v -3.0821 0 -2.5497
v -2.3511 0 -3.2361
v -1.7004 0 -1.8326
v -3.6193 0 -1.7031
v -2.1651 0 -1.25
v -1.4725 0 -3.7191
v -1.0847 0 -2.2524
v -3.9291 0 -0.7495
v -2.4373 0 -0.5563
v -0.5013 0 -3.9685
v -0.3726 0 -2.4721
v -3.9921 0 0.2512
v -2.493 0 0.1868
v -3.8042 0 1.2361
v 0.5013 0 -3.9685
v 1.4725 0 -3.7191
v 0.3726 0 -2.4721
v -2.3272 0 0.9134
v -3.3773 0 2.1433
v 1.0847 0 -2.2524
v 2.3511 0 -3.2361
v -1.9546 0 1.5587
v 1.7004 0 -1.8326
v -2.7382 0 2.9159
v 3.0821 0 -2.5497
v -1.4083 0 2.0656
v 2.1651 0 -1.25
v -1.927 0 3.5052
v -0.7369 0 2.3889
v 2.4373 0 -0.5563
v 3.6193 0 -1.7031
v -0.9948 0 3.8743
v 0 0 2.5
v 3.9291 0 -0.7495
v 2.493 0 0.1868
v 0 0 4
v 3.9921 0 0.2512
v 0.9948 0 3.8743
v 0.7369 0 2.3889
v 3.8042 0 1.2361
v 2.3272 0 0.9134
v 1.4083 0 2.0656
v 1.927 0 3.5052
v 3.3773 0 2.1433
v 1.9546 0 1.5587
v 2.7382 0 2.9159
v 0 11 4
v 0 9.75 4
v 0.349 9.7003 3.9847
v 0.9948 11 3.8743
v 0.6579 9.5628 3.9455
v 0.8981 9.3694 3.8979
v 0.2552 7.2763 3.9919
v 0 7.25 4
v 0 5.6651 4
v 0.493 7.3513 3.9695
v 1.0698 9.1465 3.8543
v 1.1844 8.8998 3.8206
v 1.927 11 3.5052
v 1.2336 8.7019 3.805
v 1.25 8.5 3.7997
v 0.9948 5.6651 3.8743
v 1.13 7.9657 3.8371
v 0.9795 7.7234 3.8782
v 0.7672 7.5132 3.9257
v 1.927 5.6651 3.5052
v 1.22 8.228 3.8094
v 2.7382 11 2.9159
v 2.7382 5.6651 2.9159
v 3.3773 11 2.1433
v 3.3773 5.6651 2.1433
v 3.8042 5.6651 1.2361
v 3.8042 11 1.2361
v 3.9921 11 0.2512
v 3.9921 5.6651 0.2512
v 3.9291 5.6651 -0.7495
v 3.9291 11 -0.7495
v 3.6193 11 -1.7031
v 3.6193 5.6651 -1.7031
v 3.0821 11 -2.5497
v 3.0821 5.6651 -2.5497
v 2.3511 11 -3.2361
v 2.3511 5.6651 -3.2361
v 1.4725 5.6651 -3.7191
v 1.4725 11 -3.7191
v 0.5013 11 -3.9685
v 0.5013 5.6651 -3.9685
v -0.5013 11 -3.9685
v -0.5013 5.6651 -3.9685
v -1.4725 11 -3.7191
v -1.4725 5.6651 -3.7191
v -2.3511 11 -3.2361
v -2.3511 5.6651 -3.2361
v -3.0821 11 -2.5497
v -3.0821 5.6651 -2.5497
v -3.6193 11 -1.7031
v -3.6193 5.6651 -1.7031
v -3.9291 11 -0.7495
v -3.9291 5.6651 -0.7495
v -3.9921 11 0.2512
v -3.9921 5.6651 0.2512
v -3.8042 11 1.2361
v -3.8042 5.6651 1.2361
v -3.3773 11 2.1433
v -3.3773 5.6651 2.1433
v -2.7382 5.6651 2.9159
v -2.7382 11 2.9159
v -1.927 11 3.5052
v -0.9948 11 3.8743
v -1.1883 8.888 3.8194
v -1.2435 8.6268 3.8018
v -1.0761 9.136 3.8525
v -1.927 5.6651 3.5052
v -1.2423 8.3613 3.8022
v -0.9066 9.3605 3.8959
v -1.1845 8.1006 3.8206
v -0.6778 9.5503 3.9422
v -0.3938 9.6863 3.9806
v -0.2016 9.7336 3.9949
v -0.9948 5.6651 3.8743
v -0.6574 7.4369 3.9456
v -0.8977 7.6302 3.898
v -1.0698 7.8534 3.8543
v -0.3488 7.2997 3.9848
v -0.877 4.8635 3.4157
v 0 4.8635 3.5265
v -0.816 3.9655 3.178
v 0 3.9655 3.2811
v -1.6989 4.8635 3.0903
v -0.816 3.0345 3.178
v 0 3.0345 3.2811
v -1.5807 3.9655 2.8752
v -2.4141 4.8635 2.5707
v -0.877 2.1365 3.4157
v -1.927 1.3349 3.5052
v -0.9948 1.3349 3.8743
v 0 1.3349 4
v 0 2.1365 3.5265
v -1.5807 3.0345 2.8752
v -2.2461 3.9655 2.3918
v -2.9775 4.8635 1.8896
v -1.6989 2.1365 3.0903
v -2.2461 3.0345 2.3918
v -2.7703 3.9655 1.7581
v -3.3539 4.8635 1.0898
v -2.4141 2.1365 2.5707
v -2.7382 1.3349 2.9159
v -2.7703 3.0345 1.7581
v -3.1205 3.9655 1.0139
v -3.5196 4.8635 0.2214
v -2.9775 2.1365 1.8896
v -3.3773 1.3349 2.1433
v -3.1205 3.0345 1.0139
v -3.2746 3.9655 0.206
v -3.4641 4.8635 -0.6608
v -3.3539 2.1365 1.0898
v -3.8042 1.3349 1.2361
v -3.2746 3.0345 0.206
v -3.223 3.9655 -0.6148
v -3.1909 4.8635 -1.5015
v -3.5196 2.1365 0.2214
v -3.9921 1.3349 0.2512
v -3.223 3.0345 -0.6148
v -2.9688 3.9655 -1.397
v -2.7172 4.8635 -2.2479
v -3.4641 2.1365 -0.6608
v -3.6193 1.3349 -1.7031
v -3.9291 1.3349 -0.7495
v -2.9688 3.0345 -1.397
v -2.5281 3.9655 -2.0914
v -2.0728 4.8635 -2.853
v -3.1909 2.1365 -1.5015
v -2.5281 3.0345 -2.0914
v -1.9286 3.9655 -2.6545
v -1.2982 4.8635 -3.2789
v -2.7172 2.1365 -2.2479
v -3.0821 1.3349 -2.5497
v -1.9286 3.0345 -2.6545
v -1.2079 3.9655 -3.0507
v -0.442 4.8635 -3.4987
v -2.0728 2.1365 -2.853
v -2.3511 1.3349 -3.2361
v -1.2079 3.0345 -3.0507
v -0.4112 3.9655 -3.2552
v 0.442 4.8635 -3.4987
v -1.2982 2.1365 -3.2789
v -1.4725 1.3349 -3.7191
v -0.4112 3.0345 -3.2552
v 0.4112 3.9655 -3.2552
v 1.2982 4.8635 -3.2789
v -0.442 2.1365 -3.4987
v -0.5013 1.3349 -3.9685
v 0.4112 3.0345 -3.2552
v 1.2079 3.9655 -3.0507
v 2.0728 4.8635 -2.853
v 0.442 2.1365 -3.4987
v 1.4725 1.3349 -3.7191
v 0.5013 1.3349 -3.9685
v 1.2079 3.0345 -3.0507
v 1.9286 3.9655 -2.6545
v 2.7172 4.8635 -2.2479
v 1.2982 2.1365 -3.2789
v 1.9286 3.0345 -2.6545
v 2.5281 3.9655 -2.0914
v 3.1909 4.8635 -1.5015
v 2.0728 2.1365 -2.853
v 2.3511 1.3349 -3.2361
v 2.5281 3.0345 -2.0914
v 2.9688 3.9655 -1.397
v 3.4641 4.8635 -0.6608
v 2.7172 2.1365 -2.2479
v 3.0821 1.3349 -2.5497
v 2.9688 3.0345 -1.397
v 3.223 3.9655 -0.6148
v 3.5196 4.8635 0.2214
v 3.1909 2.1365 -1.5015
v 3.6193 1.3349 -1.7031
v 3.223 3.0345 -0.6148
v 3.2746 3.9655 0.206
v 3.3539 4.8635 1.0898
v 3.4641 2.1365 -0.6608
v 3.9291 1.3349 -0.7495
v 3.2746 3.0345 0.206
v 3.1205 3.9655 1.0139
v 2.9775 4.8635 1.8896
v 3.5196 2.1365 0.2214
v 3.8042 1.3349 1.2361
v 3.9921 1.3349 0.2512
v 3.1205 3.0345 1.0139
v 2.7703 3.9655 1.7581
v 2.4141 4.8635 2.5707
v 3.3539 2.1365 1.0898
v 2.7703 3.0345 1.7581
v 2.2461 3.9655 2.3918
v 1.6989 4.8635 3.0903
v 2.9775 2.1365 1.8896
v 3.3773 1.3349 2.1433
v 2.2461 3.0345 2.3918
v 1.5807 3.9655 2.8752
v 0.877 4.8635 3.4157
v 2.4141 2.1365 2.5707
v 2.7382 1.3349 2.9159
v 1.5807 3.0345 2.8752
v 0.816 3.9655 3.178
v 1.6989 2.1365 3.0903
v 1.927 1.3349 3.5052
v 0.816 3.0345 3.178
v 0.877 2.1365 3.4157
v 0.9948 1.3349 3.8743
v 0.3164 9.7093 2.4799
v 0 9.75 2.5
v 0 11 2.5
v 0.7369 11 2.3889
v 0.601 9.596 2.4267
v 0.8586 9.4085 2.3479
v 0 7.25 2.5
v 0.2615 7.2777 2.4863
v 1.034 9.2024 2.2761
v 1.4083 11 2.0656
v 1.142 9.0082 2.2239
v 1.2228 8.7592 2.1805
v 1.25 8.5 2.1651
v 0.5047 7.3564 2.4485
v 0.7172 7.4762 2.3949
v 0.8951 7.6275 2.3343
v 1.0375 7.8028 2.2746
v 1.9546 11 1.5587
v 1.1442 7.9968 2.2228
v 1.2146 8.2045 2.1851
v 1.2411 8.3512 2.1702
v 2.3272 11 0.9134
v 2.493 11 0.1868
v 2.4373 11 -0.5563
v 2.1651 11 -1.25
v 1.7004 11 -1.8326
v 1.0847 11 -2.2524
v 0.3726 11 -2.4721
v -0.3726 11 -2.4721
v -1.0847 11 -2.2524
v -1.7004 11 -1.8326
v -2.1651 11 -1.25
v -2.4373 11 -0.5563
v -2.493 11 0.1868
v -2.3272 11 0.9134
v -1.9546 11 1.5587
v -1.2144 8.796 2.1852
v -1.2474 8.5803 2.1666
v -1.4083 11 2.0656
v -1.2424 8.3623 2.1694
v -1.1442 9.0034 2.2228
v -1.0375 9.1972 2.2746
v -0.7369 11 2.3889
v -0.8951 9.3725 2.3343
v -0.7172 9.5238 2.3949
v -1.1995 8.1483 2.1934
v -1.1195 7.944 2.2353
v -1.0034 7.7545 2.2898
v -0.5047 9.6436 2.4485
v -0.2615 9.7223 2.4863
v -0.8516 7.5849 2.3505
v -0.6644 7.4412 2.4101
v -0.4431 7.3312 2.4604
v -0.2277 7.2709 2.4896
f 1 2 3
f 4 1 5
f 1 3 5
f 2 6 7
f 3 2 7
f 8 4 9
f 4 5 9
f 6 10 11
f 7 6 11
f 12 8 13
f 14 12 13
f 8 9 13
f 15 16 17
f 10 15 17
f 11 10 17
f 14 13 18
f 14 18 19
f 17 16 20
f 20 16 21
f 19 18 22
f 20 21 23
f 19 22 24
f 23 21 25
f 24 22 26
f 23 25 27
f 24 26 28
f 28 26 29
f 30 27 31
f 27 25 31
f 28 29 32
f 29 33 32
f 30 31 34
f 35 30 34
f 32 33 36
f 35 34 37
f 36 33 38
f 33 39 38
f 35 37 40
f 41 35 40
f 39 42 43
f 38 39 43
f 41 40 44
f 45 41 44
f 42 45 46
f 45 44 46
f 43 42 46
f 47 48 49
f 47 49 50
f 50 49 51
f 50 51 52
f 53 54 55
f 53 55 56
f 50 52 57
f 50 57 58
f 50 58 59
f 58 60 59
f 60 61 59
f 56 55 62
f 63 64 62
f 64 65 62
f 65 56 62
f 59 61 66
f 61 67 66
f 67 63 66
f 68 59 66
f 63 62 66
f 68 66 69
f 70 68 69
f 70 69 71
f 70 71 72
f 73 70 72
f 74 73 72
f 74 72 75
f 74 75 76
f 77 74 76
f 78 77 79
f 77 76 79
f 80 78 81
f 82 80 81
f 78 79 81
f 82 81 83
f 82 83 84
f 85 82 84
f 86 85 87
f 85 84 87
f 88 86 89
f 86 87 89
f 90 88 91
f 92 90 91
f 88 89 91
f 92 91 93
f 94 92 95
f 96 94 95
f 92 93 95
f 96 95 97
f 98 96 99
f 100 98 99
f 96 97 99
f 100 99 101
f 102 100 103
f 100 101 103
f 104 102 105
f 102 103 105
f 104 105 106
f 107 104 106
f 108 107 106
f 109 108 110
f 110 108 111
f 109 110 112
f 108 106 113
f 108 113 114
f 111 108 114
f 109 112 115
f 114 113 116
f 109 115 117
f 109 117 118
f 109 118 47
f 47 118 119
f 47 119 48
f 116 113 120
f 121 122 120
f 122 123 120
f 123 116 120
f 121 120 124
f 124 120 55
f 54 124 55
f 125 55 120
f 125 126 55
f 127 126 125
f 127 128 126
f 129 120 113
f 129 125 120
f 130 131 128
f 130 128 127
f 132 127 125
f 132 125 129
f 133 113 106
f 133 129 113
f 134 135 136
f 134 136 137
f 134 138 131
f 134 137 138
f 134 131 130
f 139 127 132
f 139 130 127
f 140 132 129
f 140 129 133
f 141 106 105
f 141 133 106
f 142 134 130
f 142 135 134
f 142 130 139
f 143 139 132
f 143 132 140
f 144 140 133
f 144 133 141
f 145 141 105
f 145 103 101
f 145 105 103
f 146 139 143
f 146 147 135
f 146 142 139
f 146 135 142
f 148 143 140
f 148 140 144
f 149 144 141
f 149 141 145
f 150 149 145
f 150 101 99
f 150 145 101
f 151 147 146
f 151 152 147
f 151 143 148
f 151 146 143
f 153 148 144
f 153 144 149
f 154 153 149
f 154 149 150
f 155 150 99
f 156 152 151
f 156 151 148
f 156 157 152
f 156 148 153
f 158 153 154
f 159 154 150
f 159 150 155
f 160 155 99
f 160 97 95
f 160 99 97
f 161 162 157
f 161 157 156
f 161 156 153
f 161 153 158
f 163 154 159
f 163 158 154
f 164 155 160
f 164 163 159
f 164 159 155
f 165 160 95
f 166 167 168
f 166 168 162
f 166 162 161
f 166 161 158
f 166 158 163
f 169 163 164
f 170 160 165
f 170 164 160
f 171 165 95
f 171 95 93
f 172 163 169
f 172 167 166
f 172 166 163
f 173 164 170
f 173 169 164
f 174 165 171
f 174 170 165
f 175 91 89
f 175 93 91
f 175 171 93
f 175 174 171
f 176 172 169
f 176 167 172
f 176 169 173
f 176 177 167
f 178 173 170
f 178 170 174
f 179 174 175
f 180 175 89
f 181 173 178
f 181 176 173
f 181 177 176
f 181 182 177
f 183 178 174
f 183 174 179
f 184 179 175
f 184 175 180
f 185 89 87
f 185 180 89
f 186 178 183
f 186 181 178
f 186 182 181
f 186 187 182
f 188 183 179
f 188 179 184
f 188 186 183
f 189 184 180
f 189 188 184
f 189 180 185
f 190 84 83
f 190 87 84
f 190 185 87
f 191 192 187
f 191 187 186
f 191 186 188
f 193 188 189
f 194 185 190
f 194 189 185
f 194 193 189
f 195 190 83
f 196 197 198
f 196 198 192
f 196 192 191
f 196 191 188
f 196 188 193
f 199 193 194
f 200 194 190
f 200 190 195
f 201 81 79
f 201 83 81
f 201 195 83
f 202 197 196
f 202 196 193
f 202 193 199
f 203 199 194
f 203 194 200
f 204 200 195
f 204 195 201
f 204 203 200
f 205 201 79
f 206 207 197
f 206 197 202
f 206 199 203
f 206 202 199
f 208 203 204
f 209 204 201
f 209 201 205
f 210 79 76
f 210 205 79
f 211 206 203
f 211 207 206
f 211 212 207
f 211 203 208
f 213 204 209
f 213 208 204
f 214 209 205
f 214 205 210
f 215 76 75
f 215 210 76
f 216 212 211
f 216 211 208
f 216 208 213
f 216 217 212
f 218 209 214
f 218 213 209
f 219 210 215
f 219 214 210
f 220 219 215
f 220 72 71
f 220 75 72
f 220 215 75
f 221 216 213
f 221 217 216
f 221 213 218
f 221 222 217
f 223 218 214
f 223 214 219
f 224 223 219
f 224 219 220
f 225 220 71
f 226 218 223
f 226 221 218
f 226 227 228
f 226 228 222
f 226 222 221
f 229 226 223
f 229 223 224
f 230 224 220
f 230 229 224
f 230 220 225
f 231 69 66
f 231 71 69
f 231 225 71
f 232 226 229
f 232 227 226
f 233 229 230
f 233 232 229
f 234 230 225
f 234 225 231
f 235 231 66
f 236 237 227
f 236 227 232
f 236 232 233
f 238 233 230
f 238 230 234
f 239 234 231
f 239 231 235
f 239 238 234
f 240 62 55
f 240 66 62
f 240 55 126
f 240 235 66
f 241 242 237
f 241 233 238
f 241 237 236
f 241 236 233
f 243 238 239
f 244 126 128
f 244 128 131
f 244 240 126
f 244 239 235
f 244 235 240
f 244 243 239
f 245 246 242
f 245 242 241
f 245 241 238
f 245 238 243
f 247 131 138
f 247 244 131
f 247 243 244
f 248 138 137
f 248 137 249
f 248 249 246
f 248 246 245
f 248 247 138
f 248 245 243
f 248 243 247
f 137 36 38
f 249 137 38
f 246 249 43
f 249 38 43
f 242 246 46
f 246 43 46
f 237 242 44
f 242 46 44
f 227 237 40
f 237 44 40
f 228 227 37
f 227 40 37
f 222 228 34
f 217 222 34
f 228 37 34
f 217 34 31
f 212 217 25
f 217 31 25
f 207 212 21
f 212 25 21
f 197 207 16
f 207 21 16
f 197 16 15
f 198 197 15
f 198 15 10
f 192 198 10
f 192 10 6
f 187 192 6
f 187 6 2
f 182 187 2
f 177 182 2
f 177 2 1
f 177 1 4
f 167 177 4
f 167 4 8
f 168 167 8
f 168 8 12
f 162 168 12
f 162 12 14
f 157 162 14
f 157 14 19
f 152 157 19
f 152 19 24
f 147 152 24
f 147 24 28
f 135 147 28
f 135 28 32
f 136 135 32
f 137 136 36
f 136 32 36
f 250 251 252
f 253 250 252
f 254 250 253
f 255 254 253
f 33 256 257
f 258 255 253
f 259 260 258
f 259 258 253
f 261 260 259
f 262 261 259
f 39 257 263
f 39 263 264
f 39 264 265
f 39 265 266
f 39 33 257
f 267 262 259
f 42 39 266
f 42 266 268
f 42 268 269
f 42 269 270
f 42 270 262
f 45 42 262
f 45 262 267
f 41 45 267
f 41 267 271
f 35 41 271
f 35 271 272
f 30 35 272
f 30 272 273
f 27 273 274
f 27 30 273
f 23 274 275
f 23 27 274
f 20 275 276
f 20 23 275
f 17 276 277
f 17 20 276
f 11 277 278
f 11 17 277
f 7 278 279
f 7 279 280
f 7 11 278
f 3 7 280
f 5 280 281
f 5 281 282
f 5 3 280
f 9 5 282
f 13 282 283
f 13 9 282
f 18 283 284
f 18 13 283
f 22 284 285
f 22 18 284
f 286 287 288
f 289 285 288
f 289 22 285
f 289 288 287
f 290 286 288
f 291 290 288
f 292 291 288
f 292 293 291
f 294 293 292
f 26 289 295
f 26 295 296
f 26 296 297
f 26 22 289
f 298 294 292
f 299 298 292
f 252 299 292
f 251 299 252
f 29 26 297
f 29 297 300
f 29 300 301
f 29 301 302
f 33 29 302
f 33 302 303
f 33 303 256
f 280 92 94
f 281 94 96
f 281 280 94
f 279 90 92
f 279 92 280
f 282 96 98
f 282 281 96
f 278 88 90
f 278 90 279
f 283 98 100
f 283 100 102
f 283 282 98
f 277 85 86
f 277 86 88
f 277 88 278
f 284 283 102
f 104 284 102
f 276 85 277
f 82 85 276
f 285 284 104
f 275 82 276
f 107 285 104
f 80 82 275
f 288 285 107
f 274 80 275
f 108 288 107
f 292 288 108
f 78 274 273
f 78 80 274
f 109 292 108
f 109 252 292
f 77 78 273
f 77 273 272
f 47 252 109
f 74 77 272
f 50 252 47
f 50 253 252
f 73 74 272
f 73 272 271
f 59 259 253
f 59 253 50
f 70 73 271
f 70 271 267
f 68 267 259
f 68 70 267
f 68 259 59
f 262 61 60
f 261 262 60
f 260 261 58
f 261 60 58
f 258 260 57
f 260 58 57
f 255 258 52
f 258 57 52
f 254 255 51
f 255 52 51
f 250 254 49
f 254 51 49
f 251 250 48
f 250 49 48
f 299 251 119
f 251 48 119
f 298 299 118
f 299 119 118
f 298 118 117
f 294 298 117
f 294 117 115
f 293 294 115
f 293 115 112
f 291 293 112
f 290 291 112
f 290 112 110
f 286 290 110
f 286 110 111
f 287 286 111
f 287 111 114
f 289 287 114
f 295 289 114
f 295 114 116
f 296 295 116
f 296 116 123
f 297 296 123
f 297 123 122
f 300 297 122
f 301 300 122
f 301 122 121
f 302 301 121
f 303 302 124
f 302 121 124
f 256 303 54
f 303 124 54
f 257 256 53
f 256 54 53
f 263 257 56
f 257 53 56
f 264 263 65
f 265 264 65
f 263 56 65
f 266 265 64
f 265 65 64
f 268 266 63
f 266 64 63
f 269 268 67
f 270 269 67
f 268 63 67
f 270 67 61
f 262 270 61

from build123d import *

# Parameters (mm, degrees)
SKETCH1_R              = 4
SKETCH1_R_2            = 2.5
BOSS_EXTRUDE1_DEPTH    = 11
M3_TAPPED_HOLE1_REACH  = 16.177
M3_TAPPED_HOLE1_BORE_R = 1.25
SKETCH8_R              = 3.5


with BuildPart() as part:
    # Sketch1 → Boss-Extrude1 (new body)
    with BuildSketch(Plane(origin=(0, 0, 0), x_dir=(1, 0, 0), z_dir=(0, 1, 0))):
        with Locations(Location((0, 0, 0), (0, 0, 270))):
            Circle(SKETCH1_R)
        with Locations(Location((0, 0, 0), (0, 0, 270))):
            Circle(SKETCH1_R_2, mode=Mode.SUBTRACT)
    extrude(amount=BOSS_EXTRUDE1_DEPTH)

    # M3 Tapped Hole1 bore → M3 Tapped Hole1 (cut, up to next)
    with BuildSketch(Plane.XY.offset(4), mode=Mode.PRIVATE) as m3_tapped_hole1_sk1:
        with Locations((0, 8.5)):
            Circle(M3_TAPPED_HOLE1_BORE_R)
    m3_tapped_hole1_tool1 = extrude(m3_tapped_hole1_sk1.sketch, amount=-M3_TAPPED_HOLE1_REACH, mode=Mode.PRIVATE) & part.part
    add(m3_tapped_hole1_tool1.solids().sort_by_distance((0, 8.5, 4))[0], mode=Mode.SUBTRACT)

    # Sketch8 → Cut-Revolve2 (revolve, cut)
    with BuildSketch(Plane.XY, mode=Mode.PRIVATE) as cut_revolve2_sk:
        with Locations((6.75, 3.5)):
            Circle(SKETCH8_R)
    revolve(cut_revolve2_sk.sketch.rotate(Axis((0, 11, 0), (0, -1, 0)), 90), axis=Axis((0, 11, 0), (0, -1, 0)), mode=Mode.SUBTRACT)


solid = part.part
